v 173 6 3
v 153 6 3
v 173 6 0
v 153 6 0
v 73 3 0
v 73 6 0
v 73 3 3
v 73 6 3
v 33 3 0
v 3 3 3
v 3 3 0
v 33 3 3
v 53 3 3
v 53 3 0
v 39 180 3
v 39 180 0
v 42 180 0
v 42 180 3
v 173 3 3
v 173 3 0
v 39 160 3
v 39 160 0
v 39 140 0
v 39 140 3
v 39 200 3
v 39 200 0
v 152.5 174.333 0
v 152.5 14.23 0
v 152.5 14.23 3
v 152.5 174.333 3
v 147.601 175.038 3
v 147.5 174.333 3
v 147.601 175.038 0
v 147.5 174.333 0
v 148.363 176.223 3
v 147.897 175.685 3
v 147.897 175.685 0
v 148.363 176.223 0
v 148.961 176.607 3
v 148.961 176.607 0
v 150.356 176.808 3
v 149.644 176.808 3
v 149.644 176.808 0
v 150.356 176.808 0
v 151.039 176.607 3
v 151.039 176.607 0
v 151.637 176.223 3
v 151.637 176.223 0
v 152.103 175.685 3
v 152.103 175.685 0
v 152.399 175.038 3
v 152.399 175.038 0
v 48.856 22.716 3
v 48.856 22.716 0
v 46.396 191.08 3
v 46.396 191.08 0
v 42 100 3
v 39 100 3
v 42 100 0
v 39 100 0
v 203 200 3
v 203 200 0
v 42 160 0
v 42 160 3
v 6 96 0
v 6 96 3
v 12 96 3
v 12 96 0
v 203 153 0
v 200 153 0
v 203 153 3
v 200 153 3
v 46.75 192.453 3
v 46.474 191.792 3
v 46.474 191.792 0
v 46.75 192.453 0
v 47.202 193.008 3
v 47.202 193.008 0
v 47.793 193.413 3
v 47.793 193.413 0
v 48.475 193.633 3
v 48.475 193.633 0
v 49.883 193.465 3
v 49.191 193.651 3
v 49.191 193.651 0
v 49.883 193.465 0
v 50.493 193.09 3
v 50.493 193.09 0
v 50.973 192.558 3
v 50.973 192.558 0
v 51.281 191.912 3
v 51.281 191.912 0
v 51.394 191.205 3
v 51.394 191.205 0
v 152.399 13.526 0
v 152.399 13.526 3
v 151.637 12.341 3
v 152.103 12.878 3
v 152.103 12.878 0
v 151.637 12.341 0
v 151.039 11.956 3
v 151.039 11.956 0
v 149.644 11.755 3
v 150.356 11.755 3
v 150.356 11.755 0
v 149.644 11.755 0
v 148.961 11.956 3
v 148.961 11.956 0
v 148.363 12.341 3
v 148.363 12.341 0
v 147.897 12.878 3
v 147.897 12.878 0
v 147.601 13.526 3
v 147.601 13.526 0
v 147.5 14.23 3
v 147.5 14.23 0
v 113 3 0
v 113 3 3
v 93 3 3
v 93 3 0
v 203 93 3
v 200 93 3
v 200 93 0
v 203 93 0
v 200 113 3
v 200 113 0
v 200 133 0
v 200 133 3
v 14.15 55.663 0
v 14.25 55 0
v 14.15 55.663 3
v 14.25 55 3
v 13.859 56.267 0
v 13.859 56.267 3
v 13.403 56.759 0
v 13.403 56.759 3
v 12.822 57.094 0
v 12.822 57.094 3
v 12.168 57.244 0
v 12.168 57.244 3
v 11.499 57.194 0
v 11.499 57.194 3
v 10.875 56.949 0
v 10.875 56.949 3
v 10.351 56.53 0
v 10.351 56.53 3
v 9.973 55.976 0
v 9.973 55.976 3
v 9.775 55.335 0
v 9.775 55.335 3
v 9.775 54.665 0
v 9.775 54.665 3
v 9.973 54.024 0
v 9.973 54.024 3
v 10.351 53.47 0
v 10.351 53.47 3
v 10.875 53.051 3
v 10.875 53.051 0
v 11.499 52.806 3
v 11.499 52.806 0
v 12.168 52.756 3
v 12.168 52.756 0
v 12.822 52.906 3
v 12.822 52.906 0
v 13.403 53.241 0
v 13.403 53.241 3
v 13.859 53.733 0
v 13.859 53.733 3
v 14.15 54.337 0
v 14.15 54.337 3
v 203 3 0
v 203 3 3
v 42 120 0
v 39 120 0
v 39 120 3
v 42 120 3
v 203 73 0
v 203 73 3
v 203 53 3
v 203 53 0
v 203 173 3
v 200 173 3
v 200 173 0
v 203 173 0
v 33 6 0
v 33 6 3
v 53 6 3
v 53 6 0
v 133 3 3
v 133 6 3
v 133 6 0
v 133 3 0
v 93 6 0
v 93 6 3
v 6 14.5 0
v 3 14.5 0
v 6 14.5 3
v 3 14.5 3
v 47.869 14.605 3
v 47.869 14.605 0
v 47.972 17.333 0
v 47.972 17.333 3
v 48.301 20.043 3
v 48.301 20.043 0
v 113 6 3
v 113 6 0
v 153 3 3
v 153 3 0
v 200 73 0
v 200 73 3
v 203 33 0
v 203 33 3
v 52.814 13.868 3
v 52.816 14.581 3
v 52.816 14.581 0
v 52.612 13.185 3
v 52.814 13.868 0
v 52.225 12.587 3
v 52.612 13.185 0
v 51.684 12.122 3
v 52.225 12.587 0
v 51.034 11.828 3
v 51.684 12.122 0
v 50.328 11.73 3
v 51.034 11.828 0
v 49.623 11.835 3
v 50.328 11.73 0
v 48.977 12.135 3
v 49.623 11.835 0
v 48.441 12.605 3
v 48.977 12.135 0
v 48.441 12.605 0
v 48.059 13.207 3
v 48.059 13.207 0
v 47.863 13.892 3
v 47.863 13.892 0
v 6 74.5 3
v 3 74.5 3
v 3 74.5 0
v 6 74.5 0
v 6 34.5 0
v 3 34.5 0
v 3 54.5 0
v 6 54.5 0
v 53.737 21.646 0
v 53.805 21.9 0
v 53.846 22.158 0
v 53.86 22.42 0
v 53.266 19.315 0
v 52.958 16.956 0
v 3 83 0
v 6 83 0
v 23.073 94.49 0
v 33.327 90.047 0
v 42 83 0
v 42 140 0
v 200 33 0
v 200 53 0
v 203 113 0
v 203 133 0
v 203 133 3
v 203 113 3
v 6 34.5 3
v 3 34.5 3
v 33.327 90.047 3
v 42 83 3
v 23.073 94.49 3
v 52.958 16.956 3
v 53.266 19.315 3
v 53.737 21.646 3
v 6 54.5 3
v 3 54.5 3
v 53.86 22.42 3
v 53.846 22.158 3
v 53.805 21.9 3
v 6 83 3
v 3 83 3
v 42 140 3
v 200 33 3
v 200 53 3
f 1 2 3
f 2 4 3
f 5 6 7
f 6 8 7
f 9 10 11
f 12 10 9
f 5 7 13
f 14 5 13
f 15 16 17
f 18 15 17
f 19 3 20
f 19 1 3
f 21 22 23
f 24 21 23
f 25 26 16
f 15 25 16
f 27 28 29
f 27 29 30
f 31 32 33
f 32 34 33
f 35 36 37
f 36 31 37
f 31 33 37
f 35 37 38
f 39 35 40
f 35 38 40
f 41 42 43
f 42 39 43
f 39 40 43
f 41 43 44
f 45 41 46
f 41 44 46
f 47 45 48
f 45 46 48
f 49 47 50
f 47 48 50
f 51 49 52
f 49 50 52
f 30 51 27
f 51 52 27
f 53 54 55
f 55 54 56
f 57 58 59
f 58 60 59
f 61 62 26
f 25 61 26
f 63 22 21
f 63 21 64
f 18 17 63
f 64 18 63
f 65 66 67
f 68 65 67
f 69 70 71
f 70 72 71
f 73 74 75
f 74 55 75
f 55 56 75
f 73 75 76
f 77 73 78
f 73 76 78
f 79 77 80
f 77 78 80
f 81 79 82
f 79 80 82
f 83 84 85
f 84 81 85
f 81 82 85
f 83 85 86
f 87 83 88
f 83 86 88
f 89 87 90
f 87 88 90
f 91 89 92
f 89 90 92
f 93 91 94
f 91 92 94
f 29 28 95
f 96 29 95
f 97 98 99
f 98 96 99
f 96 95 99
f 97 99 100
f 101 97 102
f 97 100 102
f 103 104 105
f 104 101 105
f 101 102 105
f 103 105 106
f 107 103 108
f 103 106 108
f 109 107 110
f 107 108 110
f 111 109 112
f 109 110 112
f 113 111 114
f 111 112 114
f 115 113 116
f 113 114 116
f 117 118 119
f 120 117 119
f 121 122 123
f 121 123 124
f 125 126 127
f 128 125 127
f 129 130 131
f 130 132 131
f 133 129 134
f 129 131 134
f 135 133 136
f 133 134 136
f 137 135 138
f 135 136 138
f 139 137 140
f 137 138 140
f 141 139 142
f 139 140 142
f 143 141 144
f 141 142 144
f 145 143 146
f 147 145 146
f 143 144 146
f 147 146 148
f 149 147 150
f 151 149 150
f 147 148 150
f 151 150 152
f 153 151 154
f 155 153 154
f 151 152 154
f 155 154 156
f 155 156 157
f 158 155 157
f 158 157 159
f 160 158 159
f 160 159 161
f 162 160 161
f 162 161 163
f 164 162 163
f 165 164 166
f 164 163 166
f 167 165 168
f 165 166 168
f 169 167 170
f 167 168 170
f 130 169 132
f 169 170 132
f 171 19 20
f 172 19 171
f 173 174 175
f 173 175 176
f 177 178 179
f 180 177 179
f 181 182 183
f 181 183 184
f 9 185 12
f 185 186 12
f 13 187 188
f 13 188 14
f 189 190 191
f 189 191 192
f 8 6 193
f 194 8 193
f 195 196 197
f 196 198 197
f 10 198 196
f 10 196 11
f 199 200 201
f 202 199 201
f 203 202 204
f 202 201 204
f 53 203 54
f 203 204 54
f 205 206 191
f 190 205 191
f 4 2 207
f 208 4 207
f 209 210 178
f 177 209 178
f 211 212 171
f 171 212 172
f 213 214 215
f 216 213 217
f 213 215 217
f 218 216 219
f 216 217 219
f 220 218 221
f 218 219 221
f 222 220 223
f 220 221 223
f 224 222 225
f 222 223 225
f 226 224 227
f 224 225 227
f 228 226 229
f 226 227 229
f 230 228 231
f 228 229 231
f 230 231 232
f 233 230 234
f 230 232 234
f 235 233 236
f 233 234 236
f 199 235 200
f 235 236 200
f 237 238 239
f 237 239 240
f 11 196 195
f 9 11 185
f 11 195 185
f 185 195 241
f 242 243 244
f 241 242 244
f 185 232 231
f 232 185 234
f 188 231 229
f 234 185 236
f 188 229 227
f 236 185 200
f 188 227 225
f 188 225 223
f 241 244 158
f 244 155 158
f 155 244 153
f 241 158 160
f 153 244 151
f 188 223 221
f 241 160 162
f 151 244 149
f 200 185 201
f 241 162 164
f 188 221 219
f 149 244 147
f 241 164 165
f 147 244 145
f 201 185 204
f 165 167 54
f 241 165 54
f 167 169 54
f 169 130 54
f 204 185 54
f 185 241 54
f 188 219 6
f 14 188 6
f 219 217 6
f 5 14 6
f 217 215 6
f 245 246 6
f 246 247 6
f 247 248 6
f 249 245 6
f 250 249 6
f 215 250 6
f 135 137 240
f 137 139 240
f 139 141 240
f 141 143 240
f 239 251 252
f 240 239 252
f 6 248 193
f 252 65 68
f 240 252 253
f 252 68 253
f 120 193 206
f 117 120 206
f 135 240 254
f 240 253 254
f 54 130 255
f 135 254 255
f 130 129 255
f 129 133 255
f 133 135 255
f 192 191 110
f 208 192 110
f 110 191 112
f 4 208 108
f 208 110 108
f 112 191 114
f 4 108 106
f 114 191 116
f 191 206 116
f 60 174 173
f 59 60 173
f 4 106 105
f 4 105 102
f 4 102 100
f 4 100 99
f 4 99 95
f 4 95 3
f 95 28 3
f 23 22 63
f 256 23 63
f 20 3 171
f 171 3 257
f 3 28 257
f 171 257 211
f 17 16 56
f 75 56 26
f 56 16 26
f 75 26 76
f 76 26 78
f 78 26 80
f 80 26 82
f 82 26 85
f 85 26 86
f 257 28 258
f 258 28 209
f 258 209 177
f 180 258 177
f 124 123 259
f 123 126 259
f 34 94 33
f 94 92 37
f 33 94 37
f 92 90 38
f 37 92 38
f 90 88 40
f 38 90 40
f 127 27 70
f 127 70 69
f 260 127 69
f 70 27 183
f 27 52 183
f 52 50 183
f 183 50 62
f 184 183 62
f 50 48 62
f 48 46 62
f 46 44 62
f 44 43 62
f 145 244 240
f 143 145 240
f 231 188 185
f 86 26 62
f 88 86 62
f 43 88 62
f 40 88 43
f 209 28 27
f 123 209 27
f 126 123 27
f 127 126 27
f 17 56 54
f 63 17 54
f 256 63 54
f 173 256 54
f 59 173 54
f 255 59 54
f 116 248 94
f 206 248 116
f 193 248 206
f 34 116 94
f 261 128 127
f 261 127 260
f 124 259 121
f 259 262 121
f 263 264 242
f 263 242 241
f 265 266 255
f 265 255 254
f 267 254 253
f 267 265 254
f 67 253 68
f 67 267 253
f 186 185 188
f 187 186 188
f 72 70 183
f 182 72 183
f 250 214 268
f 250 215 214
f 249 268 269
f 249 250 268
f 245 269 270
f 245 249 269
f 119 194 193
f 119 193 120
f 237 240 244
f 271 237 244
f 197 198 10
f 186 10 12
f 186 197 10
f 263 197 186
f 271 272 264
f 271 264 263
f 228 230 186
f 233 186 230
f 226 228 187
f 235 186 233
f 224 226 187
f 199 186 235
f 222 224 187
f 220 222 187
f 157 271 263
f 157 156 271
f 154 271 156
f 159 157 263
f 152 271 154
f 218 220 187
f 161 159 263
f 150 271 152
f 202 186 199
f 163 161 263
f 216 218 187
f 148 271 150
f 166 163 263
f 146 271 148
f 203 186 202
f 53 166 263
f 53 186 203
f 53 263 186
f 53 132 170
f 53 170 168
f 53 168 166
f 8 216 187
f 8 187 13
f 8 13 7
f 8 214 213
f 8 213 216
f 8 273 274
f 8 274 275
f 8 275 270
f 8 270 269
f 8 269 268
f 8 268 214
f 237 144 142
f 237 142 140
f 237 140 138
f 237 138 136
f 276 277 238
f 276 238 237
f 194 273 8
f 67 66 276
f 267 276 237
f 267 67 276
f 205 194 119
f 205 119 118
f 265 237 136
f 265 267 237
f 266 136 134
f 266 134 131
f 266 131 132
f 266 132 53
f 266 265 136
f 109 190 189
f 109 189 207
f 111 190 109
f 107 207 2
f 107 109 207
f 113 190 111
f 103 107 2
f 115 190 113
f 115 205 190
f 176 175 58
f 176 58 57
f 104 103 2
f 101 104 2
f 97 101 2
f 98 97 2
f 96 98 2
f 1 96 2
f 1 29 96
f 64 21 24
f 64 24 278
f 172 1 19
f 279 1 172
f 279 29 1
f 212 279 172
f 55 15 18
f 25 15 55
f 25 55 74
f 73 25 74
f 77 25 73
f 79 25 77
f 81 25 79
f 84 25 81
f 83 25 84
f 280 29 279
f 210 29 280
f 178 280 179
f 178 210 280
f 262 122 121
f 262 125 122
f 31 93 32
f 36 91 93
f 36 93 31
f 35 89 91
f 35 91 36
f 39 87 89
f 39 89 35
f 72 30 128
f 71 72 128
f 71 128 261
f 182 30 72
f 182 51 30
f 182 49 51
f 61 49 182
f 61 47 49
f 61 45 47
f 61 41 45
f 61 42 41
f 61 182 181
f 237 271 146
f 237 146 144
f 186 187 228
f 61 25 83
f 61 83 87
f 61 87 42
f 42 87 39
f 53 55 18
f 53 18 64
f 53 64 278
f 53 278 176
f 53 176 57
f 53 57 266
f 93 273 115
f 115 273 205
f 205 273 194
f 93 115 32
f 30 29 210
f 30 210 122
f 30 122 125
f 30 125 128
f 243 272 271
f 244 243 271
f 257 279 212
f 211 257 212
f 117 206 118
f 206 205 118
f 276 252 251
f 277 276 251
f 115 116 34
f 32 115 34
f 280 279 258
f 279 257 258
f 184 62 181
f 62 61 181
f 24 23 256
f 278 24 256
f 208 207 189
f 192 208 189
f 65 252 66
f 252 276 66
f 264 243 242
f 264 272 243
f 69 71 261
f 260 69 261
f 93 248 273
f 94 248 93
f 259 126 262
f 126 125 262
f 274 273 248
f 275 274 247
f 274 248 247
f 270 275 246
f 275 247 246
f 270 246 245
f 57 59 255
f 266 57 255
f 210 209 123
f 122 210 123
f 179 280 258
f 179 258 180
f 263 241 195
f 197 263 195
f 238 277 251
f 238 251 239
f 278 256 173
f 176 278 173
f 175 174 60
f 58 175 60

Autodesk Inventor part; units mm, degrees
ref_plane "YZ Plane" through (0, 0, 0) normal (1, 0, 0) x (0, 1, 0)
ref_plane "XZ Plane" through (0, 0, 0) normal (0, 1, 0) x (-1, 0, 0)
ref_plane "XY Plane" through (0, 0, 0) normal (0, 0, 1) x (1, 0, 0)
sketch "Sketch1" plane through (0, 0, 0) normal (0, 0, 1) x (1, 0, 0)
  line L0 (6, 6) -> (200, 6)
  line L1 (200, 6) -> (200, 200)
  line L2 (200, 200) -> (42, 200)
  line L3 (6, 83) -> (6, 6)
  line L4 (6, 6) -> (56, 6)
  line L5 (200, 6) -> (150, 6)
  line L6 (200, 6) -> (200, 153)
  line L7 (150, 6) -> (142.5, 6)
  line L8 (200, 6) -> (200, 166)
  arc A0 (152.5, 174.3333) -> (147.5, 174.3333) centre (150, 174.3333) ccw
  line L9 (150, 6) -> (50, 6)
  arc A1 (47.8689, 14.6053) -> (52.8158, 14.5813) centre (50.3406, 14.23) ccw
  arc A2 (53.8259, 22.009) -> (52.8051, 13.8106) centre (86.918, 13.7258) ccw
  arc A3 (51.3944, 191.2047) -> (46.3962, 191.0801) centre (48.8946, 191.1682) ccw
  line L10 (53.8599, 22.4199) -> (51.3944, 191.2047)
  line L11 (48.8556, 22.7156) -> (46.3962, 191.0801)
  arc A4 (53.7373, 21.6465) -> (53.8589, 22.4929) centre (51.3599, 22.4199) ccw
  arc A5 (48.8556, 22.7156) -> (47.8689, 14.6053) centre (80.6169, 14.7362) ccw
  line L12 (52.8406, 14.23) -> (52.8088, 14.23)
  arc A6 (147.5, 14.23) -> (152.5, 14.23) centre (150, 14.23) ccw
  line L13 (147.5, 14.23) -> (147.5, 174.3333)
  line L14 (152.5, 14.23) -> (152.5, 174.3333)
  line L15 (42, 83) -> (6, 83)
  line L16 (42, 200) -> (39, 200)
  line L17 (39, 200) -> (39, 180)
  line L18 (39, 160) -> (39, 140)
  line L19 (39, 120) -> (39, 100)
  line L20 (39, 100) -> (42, 100)
  line L21 (39, 120) -> (42, 120)
  line L22 (39, 140) -> (42, 140)
  line L23 (39, 160) -> (42, 160)
  line L24 (39, 180) -> (42, 180)
  line L25 (39, 120) -> (39, 100)
  line L26 (39, 200) -> (39, 180)
  line L27 (39, 160) -> (39, 140)
  line L28 (42, 180) -> (42, 160)
  line L29 (42, 140) -> (42, 120)
  line L30 (42, 100) -> (42, 83)
  dimension "d1" = 194
extrude "Extrusion1" add sketch "Sketch1" along normal blind 3
sketch "Sketch2" plane through (0, 0, 3) normal (0, 0, 1) x (1, 0, 0)
  line L0 (200, 6) -> (200, 200) projected
  line L1 (200, 200) -> (39, 200) projected
  line L2 (42, 180) -> (42, 160) projected
  line L3 (42, 83) -> (6, 83) projected
  line L4 (6, 83) -> (6, 6) projected
  line L5 (6, 6) -> (200, 6) projected
  line L6 (147.5, 14.23) -> (147.5, 174.3333) projected
  arc A0 (152.5, 174.3333) -> (147.5, 174.3333) centre (150, 174.3333) ccw projected
  line L7 (152.5, 174.3333) -> (152.5, 14.23) projected
  arc A1 (147.5, 14.23) -> (152.5, 14.23) centre (150, 14.23) ccw projected
  arc A2 (51.3944, 191.2047) -> (46.3962, 191.0801) centre (48.8946, 191.1682) ccw projected
  line L8 (51.3944, 191.2047) -> (53.8589, 22.4929) projected
  arc A3 (53.7373, 21.6465) -> (53.8589, 22.4929) centre (51.3599, 22.4199) ccw projected
  arc A4 (53.7373, 21.6465) -> (52.8158, 14.5813) centre (86.918, 13.7258) ccw projected
  arc A5 (47.8689, 14.6053) -> (52.8158, 14.5813) centre (50.3406, 14.23) ccw projected
  arc A6 (48.8556, 22.7156) -> (47.8689, 14.6053) centre (80.6169, 14.7362) ccw projected
  line L9 (48.8556, 22.7156) -> (46.3962, 191.0801) projected
  line L10 (6, 6) -> (33, 6)
  line L11 (33, 6) -> (53, 6)
  line L12 (53, 6) -> (73, 6)
  line L13 (73, 6) -> (93, 6)
  line L14 (93, 6) -> (113, 6)
  line L15 (113, 6) -> (133, 6)
  line L16 (133, 6) -> (153, 6)
  line L17 (153, 6) -> (173, 6)
  line L18 (6, 6) -> (6, 9)
  line L19 (33, 6) -> (33, 3)
  line L20 (173, 6) -> (173, 3)
  line L21 (53, 6) -> (53, 3)
  line L22 (93, 6) -> (93, 3)
  line L23 (73, 6) -> (73, 3)
  line L24 (133, 6) -> (133, 3)
  line L25 (113, 6) -> (113, 3)
  line L26 (153, 6) -> (153, 3)
  line L27 (6, 6) -> (6, 3)
  line L28 (6, 3) -> (33, 3)
  line L29 (173, 3) -> (200, 3)
  line L30 (200, 3) -> (200, 6.6126)
  line L31 (73, 3) -> (53, 3)
  line L32 (153, 3) -> (133, 3)
  line L33 (113, 3) -> (93, 3)
  line L34 (39, 200) -> (39, 180) projected
  line L35 (39, 180) -> (42, 180) projected
  line L36 (42, 160) -> (39, 160) projected
  line L37 (39, 160) -> (39, 140) projected
  line L38 (39, 140) -> (42, 140) projected
  line L39 (42, 140) -> (42, 120) projected
  line L40 (42, 120) -> (39, 120) projected
  line L41 (39, 120) -> (39, 100) projected
  line L42 (39, 100) -> (42, 100) projected
  line L43 (42, 100) -> (42, 83) projected
  point P0 (120.702, 9)
  point P1 (49.056, 9)
extrude "Extrusion2" add sketch "Sketch2" against normal blind 3 contours L30 L29 L20 L5 | L26 L32 L24 L5 | L25 L33 L22 L5 | L23 L31 L21 L5 | L19 L28 L27 L5
sketch "Sketch3" plane through (0, 0, 3) normal (0, 0, 1) x (1, 0, 0)
  line L0 (153, 6) -> (173, 6) projected
  line L1 (113, 6) -> (133, 6) projected
  line L2 (200, 3) -> (200, 200) projected
  line L3 (200, 200) -> (39, 200) projected
  line L4 (42, 180) -> (42, 160) projected
  line L5 (42, 83) -> (6, 83) projected
  line L6 (6, 83) -> (6, 3) projected
  line L7 (73, 6) -> (93, 6) projected
  line L8 (33, 6) -> (53, 6) projected
  line L9 (147.5, 14.23) -> (147.5, 174.3333) projected
  arc A0 (152.5, 174.3333) -> (147.5, 174.3333) centre (150, 174.3333) ccw projected
  line L10 (152.5, 174.3333) -> (152.5, 14.23) projected
  arc A1 (147.5, 14.23) -> (152.5, 14.23) centre (150, 14.23) ccw projected
  arc A2 (51.3944, 191.2047) -> (46.3962, 191.0801) centre (48.8946, 191.1682) ccw projected
  line L11 (51.3944, 191.2047) -> (53.8589, 22.4929) projected
  arc A3 (53.7373, 21.6465) -> (53.8589, 22.4929) centre (51.3599, 22.4199) ccw projected
  arc A4 (53.7373, 21.6465) -> (52.8158, 14.5813) centre (86.918, 13.7258) ccw projected
  arc A5 (47.8689, 14.6053) -> (52.8158, 14.5813) centre (50.3406, 14.23) ccw projected
  arc A6 (48.8556, 22.7156) -> (47.8689, 14.6053) centre (80.6169, 14.7362) ccw projected
  line L12 (48.8556, 22.7156) -> (46.3962, 191.0801) projected
  line L13 (6, 83) -> (6, 80)
  line L14 (6, 83) -> (3, 83)
  line L15 (3, 6) -> (3, 14.5)
  line L16 (3, 83) -> (3, 74.5)
  line L17 (3, 54.5) -> (3, 34.5)
  line L18 (3, 74.5) -> (6, 74.5)
  line L19 (3, 54.5) -> (6, 54.5)
  line L20 (3, 34.5) -> (6, 34.5)
  line L21 (3, 14.5) -> (6, 14.5)
  line L22 (3, 14.5) -> (3, 6)
  line L23 (3, 83) -> (3, 74.5)
  line L24 (3, 54.5) -> (3, 34.5)
  line L25 (3, 6) -> (3, 3)
  line L26 (3, 3) -> (6, 3)
  line L27 (6, 3) -> (6, 6)
  line L28 (6, 3) -> (33, 3) projected
  line L29 (33, 3) -> (33, 6) projected
  line L30 (53, 6) -> (53, 3) projected
  line L31 (53, 3) -> (73, 3) projected
  line L32 (73, 3) -> (73, 6) projected
  line L33 (93, 6) -> (93, 3) projected
  line L34 (93, 3) -> (113, 3) projected
  line L35 (113, 3) -> (113, 6) projected
  line L36 (133, 6) -> (133, 3) projected
  line L37 (133, 3) -> (153, 3) projected
  line L38 (153, 3) -> (153, 6) projected
  line L39 (173, 6) -> (173, 3) projected
  line L40 (173, 3) -> (200, 3) projected
  line L41 (39, 200) -> (39, 180) projected
  line L42 (39, 180) -> (42, 180) projected
  line L43 (42, 160) -> (39, 160) projected
  line L44 (39, 160) -> (39, 140) projected
  line L45 (39, 140) -> (42, 140) projected
  line L46 (42, 140) -> (42, 120) projected
  line L47 (42, 120) -> (39, 120) projected
  line L48 (39, 120) -> (39, 100) projected
  line L49 (39, 100) -> (42, 100) projected
  line L50 (42, 100) -> (42, 83) projected
  point P0 (6, 3)
  dimension "d43" = 3
extrude "Extrusion3" add sketch "Sketch3" against normal blind 3 contours L26 L25 L15 L21 L6 | L6 L18 L16 L14 | L20 L17 L19 L6
sketch "Sketch4" plane through (0, 0, 3) normal (0, 0, 1) x (1, 0, 0)
  line L0 (153, 6) -> (173, 6) projected
  line L1 (113, 6) -> (133, 6) projected
  line L2 (200, 200) -> (39, 200) projected
  line L3 (42, 180) -> (42, 160) projected
  line L4 (42, 83) -> (3, 83) projected
  line L5 (3, 83) -> (3, 74.5) projected
  line L6 (3, 74.5) -> (6, 74.5) projected
  line L7 (6, 74.5) -> (6, 54.5) projected
  line L8 (6, 54.5) -> (3, 54.5) projected
  line L9 (3, 54.5) -> (3, 34.5) projected
  line L10 (3, 34.5) -> (6, 34.5) projected
  line L11 (73, 6) -> (93, 6) projected
  line L12 (33, 6) -> (53, 6) projected
  line L13 (147.5, 14.23) -> (147.5, 174.3333) projected
  arc A0 (152.5, 174.3333) -> (147.5, 174.3333) centre (150, 174.3333) ccw projected
  line L14 (152.5, 174.3333) -> (152.5, 14.23) projected
  arc A1 (147.5, 14.23) -> (152.5, 14.23) centre (150, 14.23) ccw projected
  arc A2 (51.3944, 191.2047) -> (46.3962, 191.0801) centre (48.8946, 191.1682) ccw projected
  line L15 (51.3944, 191.2047) -> (53.8589, 22.4929) projected
  arc A3 (53.7373, 21.6465) -> (53.8589, 22.4929) centre (51.3599, 22.4199) ccw projected
  arc A4 (53.7373, 21.6465) -> (52.8158, 14.5813) centre (86.918, 13.7258) ccw projected
  arc A5 (47.8689, 14.6053) -> (52.8158, 14.5813) centre (50.3406, 14.23) ccw projected
  arc A6 (48.8556, 22.7156) -> (47.8689, 14.6053) centre (80.6169, 14.7362) ccw projected
  line L16 (48.8556, 22.7156) -> (46.3962, 191.0801) projected
  line L17 (200, 200) -> (203, 200)
  line L18 (200, 6) -> (200, 33)
  line L19 (200, 33) -> (200, 53)
  line L20 (200, 53) -> (200, 73)
  line L21 (200, 73) -> (200, 93)
  line L22 (200, 93) -> (200, 113)
  line L23 (200, 113) -> (200, 133)
  line L24 (200, 133) -> (200, 153)
  line L25 (200, 153) -> (200, 173)
  line L26 (200, 173) -> (200, 200)
  line L27 (200, 173) -> (203, 173)
  line L28 (200, 153) -> (203, 153)
  line L29 (200, 133) -> (203, 133)
  line L30 (200, 113) -> (203, 113)
  line L31 (200, 93) -> (203, 93)
  line L32 (200, 73) -> (203, 73)
  line L33 (200, 53) -> (203, 53)
  line L34 (200, 33) -> (203, 33)
  line L35 (203, 200) -> (203, 173)
  line L36 (203, 153) -> (203, 133)
  line L37 (203, 113) -> (203, 93)
  line L38 (203, 73) -> (203, 53)
  line L39 (203, 33) -> (203, 6)
  line L40 (200, 3) -> (200, 200) projected
  line L41 (6, 34.5) -> (6, 14.5) projected
  line L42 (3, 3) -> (33, 3) projected
  line L43 (33, 3) -> (33, 6) projected
  line L44 (53, 6) -> (53, 3) projected
  line L45 (53, 3) -> (73, 3) projected
  line L46 (73, 3) -> (73, 6) projected
  line L47 (93, 6) -> (93, 3) projected
  line L48 (93, 3) -> (113, 3) projected
  line L49 (113, 3) -> (113, 6) projected
  line L50 (133, 6) -> (133, 3) projected
  line L51 (133, 3) -> (153, 3) projected
  line L52 (153, 3) -> (153, 6) projected
  line L53 (173, 6) -> (173, 3) projected
  line L54 (173, 3) -> (200, 3) projected
  line L55 (6, 14.5) -> (3, 14.5) projected
  line L56 (3, 14.5) -> (3, 3) projected
  line L57 (200, 3) -> (203, 3)
  line L58 (203, 3) -> (203, 6)
  line L59 (39, 200) -> (39, 180) projected
  line L60 (39, 180) -> (42, 180) projected
  line L61 (42, 160) -> (39, 160) projected
  line L62 (39, 160) -> (39, 140) projected
  line L63 (39, 140) -> (42, 140) projected
  line L64 (42, 140) -> (42, 120) projected
  line L65 (42, 120) -> (39, 120) projected
  line L66 (39, 120) -> (39, 100) projected
  line L67 (39, 100) -> (42, 100) projected
  line L68 (42, 100) -> (42, 83) projected
extrude "Extrusion4" add sketch "Sketch4" against normal blind 3 contours L40 L18 L34 L39 L58 L57 | L20 L32 L38 L33 | L22 L30 L37 L31 | L24 L28 L36 L29 | L26 L17 L35 L27
sketch "Sketch7" plane through (0, 0, 3) normal (0, 0, 1) x (1, 0, 0)
  line L0 (6, 60) -> (18, 60)
  line L1 (18, 60) -> (18, 50)
  line L2 (18, 50) -> (6, 50)
  line L3 (6, 50) -> (6, 60)
  line L4 (6, 60) -> (18, 50) construction
  line L5 (18, 60) -> (6, 50) construction
  line L6 (12, 55) -> (7.5, 55)
  line L7 (7.5, 55) -> (16.5, 55)
  circle A0 centre (7.5, 55) radius 0.625
  circle A1 centre (16.5, 55) radius 0.625
  line L8 (6.875, 55) -> (12, 55)
  circle A2 centre (12, 55) radius 2.25
  dimension "d74" = 1.25
  dimension "d70" = 12
  dimension "d71" = 10
  dimension "d72" = 4.5
  dimension "d73" = 9
  dimension "d75" = 1.25
  dimension "d78" = 4.5
extrude "Extrusion5" cut sketch "Sketch7" against normal blind 3 contours A2 L7 L6 | L6 L7 A2
sketch "Sketch8" plane through (0, 0, 3) normal (0, 0, 1) x (1, 0, 0)
  circle A0 centre (12, 55) radius 2.25 projected
  line L0 (12, 55) -> (12, 96)
  circle A1 centre (12, 55) radius 2.25 projected
  line L1 (200, 33) -> (200, 53) projected
  line L2 (200, 53) -> (203, 53) projected
  line L3 (203, 53) -> (203, 73) projected
  line L4 (203, 73) -> (200, 73) projected
  line L5 (200, 73) -> (200, 93) projected
  line L6 (200, 93) -> (203, 93) projected
  line L7 (203, 93) -> (203, 113) projected
  line L8 (203, 113) -> (200, 113) projected
  line L9 (200, 113) -> (200, 133) projected
  line L10 (200, 133) -> (203, 133) projected
  line L11 (203, 133) -> (203, 153) projected
  line L12 (203, 153) -> (200, 153) projected
  line L13 (200, 153) -> (200, 173) projected
  line L14 (200, 173) -> (203, 173) projected
  line L15 (203, 173) -> (203, 200) projected
  line L16 (203, 200) -> (39, 200) projected
  line L17 (42, 180) -> (42, 160) projected
  line L18 (42, 83) -> (3, 83) projected
  line L19 (3, 83) -> (3, 74.5) projected
  line L20 (3, 74.5) -> (6, 74.5) projected
  line L21 (6, 74.5) -> (6, 54.5) projected
  line L22 (6, 54.5) -> (3, 54.5) projected
  line L23 (3, 54.5) -> (3, 34.5) projected
  line L24 (3, 34.5) -> (6, 34.5) projected
  line L25 (6, 34.5) -> (6, 14.5) projected
  line L26 (6, 14.5) -> (3, 14.5) projected
  line L27 (3, 14.5) -> (3, 3) projected
  line L28 (3, 3) -> (33, 3) projected
  line L29 (33, 3) -> (33, 6) projected
  line L30 (33, 6) -> (53, 6) projected
  line L31 (53, 6) -> (53, 3) projected
  line L32 (53, 3) -> (73, 3) projected
  line L33 (73, 3) -> (73, 6) projected
  line L34 (73, 6) -> (93, 6) projected
  line L35 (93, 6) -> (93, 3) projected
  line L36 (93, 3) -> (113, 3) projected
  line L37 (113, 3) -> (113, 6) projected
  line L38 (113, 6) -> (133, 6) projected
  line L39 (133, 6) -> (133, 3) projected
  line L40 (133, 3) -> (153, 3) projected
  line L41 (153, 3) -> (153, 6) projected
  line L42 (153, 6) -> (173, 6) projected
  line L43 (173, 6) -> (173, 3) projected
  line L44 (173, 3) -> (203, 3) projected
  line L45 (203, 3) -> (203, 33) projected
  line L46 (203, 33) -> (200, 33) projected
  line L47 (147.5, 14.23) -> (147.5, 174.3333) projected
  arc A2 (152.5, 174.3333) -> (147.5, 174.3333) centre (150, 174.3333) ccw projected
  line L48 (152.5, 174.3333) -> (152.5, 14.23) projected
  arc A3 (147.5, 14.23) -> (152.5, 14.23) centre (150, 14.23) ccw projected
  arc A4 (51.3944, 191.2047) -> (46.3962, 191.0801) centre (48.8946, 191.1682) ccw projected
  line L49 (51.3944, 191.2047) -> (53.8589, 22.4929) projected
  arc A5 (53.7373, 21.6465) -> (53.8589, 22.4929) centre (51.3599, 22.4199) ccw projected
  arc A6 (53.7373, 21.6465) -> (52.8158, 14.5813) centre (86.918, 13.7258) ccw projected
  arc A7 (47.8689, 14.6053) -> (52.8158, 14.5813) centre (50.3406, 14.23) ccw projected
  arc A8 (48.8556, 22.7156) -> (47.8689, 14.6053) centre (80.6169, 14.7362) ccw projected
  line L50 (48.8556, 22.7156) -> (46.3962, 191.0801) projected
  line L51 (42, 83) -> (3, 83) projected
  line L52 (12, 55) -> (42, 83)
  arc A9 (42, 83) -> (12, 96) centre (12.05, 55) ccw
  line L53 (3, 83) -> (6, 83)
  line L54 (6, 83) -> (6, 96)
  line L55 (6, 96) -> (12, 96)
  line L56 (6, 83) -> (42, 83)
  line L57 (39, 200) -> (39, 180) projected
  line L58 (39, 180) -> (42, 180) projected
  line L59 (42, 160) -> (39, 160) projected
  line L60 (39, 160) -> (39, 140) projected
  line L61 (39, 140) -> (42, 140) projected
  line L62 (42, 140) -> (42, 120) projected
  line L63 (42, 120) -> (39, 120) projected
  line L64 (39, 120) -> (39, 100) projected
  line L65 (39, 100) -> (42, 100) projected
  line L66 (42, 100) -> (42, 83) projected
  dimension "d79" = 41
  dimension "d80" = 41
  dimension "d81" = 3
  dimension "d82" = 13
extrude "Extrusion6" add sketch "Sketch8" against normal blind 3 contours L18 L0 A9 | L18 L54 L55 L0
properties part number "inside walls"
